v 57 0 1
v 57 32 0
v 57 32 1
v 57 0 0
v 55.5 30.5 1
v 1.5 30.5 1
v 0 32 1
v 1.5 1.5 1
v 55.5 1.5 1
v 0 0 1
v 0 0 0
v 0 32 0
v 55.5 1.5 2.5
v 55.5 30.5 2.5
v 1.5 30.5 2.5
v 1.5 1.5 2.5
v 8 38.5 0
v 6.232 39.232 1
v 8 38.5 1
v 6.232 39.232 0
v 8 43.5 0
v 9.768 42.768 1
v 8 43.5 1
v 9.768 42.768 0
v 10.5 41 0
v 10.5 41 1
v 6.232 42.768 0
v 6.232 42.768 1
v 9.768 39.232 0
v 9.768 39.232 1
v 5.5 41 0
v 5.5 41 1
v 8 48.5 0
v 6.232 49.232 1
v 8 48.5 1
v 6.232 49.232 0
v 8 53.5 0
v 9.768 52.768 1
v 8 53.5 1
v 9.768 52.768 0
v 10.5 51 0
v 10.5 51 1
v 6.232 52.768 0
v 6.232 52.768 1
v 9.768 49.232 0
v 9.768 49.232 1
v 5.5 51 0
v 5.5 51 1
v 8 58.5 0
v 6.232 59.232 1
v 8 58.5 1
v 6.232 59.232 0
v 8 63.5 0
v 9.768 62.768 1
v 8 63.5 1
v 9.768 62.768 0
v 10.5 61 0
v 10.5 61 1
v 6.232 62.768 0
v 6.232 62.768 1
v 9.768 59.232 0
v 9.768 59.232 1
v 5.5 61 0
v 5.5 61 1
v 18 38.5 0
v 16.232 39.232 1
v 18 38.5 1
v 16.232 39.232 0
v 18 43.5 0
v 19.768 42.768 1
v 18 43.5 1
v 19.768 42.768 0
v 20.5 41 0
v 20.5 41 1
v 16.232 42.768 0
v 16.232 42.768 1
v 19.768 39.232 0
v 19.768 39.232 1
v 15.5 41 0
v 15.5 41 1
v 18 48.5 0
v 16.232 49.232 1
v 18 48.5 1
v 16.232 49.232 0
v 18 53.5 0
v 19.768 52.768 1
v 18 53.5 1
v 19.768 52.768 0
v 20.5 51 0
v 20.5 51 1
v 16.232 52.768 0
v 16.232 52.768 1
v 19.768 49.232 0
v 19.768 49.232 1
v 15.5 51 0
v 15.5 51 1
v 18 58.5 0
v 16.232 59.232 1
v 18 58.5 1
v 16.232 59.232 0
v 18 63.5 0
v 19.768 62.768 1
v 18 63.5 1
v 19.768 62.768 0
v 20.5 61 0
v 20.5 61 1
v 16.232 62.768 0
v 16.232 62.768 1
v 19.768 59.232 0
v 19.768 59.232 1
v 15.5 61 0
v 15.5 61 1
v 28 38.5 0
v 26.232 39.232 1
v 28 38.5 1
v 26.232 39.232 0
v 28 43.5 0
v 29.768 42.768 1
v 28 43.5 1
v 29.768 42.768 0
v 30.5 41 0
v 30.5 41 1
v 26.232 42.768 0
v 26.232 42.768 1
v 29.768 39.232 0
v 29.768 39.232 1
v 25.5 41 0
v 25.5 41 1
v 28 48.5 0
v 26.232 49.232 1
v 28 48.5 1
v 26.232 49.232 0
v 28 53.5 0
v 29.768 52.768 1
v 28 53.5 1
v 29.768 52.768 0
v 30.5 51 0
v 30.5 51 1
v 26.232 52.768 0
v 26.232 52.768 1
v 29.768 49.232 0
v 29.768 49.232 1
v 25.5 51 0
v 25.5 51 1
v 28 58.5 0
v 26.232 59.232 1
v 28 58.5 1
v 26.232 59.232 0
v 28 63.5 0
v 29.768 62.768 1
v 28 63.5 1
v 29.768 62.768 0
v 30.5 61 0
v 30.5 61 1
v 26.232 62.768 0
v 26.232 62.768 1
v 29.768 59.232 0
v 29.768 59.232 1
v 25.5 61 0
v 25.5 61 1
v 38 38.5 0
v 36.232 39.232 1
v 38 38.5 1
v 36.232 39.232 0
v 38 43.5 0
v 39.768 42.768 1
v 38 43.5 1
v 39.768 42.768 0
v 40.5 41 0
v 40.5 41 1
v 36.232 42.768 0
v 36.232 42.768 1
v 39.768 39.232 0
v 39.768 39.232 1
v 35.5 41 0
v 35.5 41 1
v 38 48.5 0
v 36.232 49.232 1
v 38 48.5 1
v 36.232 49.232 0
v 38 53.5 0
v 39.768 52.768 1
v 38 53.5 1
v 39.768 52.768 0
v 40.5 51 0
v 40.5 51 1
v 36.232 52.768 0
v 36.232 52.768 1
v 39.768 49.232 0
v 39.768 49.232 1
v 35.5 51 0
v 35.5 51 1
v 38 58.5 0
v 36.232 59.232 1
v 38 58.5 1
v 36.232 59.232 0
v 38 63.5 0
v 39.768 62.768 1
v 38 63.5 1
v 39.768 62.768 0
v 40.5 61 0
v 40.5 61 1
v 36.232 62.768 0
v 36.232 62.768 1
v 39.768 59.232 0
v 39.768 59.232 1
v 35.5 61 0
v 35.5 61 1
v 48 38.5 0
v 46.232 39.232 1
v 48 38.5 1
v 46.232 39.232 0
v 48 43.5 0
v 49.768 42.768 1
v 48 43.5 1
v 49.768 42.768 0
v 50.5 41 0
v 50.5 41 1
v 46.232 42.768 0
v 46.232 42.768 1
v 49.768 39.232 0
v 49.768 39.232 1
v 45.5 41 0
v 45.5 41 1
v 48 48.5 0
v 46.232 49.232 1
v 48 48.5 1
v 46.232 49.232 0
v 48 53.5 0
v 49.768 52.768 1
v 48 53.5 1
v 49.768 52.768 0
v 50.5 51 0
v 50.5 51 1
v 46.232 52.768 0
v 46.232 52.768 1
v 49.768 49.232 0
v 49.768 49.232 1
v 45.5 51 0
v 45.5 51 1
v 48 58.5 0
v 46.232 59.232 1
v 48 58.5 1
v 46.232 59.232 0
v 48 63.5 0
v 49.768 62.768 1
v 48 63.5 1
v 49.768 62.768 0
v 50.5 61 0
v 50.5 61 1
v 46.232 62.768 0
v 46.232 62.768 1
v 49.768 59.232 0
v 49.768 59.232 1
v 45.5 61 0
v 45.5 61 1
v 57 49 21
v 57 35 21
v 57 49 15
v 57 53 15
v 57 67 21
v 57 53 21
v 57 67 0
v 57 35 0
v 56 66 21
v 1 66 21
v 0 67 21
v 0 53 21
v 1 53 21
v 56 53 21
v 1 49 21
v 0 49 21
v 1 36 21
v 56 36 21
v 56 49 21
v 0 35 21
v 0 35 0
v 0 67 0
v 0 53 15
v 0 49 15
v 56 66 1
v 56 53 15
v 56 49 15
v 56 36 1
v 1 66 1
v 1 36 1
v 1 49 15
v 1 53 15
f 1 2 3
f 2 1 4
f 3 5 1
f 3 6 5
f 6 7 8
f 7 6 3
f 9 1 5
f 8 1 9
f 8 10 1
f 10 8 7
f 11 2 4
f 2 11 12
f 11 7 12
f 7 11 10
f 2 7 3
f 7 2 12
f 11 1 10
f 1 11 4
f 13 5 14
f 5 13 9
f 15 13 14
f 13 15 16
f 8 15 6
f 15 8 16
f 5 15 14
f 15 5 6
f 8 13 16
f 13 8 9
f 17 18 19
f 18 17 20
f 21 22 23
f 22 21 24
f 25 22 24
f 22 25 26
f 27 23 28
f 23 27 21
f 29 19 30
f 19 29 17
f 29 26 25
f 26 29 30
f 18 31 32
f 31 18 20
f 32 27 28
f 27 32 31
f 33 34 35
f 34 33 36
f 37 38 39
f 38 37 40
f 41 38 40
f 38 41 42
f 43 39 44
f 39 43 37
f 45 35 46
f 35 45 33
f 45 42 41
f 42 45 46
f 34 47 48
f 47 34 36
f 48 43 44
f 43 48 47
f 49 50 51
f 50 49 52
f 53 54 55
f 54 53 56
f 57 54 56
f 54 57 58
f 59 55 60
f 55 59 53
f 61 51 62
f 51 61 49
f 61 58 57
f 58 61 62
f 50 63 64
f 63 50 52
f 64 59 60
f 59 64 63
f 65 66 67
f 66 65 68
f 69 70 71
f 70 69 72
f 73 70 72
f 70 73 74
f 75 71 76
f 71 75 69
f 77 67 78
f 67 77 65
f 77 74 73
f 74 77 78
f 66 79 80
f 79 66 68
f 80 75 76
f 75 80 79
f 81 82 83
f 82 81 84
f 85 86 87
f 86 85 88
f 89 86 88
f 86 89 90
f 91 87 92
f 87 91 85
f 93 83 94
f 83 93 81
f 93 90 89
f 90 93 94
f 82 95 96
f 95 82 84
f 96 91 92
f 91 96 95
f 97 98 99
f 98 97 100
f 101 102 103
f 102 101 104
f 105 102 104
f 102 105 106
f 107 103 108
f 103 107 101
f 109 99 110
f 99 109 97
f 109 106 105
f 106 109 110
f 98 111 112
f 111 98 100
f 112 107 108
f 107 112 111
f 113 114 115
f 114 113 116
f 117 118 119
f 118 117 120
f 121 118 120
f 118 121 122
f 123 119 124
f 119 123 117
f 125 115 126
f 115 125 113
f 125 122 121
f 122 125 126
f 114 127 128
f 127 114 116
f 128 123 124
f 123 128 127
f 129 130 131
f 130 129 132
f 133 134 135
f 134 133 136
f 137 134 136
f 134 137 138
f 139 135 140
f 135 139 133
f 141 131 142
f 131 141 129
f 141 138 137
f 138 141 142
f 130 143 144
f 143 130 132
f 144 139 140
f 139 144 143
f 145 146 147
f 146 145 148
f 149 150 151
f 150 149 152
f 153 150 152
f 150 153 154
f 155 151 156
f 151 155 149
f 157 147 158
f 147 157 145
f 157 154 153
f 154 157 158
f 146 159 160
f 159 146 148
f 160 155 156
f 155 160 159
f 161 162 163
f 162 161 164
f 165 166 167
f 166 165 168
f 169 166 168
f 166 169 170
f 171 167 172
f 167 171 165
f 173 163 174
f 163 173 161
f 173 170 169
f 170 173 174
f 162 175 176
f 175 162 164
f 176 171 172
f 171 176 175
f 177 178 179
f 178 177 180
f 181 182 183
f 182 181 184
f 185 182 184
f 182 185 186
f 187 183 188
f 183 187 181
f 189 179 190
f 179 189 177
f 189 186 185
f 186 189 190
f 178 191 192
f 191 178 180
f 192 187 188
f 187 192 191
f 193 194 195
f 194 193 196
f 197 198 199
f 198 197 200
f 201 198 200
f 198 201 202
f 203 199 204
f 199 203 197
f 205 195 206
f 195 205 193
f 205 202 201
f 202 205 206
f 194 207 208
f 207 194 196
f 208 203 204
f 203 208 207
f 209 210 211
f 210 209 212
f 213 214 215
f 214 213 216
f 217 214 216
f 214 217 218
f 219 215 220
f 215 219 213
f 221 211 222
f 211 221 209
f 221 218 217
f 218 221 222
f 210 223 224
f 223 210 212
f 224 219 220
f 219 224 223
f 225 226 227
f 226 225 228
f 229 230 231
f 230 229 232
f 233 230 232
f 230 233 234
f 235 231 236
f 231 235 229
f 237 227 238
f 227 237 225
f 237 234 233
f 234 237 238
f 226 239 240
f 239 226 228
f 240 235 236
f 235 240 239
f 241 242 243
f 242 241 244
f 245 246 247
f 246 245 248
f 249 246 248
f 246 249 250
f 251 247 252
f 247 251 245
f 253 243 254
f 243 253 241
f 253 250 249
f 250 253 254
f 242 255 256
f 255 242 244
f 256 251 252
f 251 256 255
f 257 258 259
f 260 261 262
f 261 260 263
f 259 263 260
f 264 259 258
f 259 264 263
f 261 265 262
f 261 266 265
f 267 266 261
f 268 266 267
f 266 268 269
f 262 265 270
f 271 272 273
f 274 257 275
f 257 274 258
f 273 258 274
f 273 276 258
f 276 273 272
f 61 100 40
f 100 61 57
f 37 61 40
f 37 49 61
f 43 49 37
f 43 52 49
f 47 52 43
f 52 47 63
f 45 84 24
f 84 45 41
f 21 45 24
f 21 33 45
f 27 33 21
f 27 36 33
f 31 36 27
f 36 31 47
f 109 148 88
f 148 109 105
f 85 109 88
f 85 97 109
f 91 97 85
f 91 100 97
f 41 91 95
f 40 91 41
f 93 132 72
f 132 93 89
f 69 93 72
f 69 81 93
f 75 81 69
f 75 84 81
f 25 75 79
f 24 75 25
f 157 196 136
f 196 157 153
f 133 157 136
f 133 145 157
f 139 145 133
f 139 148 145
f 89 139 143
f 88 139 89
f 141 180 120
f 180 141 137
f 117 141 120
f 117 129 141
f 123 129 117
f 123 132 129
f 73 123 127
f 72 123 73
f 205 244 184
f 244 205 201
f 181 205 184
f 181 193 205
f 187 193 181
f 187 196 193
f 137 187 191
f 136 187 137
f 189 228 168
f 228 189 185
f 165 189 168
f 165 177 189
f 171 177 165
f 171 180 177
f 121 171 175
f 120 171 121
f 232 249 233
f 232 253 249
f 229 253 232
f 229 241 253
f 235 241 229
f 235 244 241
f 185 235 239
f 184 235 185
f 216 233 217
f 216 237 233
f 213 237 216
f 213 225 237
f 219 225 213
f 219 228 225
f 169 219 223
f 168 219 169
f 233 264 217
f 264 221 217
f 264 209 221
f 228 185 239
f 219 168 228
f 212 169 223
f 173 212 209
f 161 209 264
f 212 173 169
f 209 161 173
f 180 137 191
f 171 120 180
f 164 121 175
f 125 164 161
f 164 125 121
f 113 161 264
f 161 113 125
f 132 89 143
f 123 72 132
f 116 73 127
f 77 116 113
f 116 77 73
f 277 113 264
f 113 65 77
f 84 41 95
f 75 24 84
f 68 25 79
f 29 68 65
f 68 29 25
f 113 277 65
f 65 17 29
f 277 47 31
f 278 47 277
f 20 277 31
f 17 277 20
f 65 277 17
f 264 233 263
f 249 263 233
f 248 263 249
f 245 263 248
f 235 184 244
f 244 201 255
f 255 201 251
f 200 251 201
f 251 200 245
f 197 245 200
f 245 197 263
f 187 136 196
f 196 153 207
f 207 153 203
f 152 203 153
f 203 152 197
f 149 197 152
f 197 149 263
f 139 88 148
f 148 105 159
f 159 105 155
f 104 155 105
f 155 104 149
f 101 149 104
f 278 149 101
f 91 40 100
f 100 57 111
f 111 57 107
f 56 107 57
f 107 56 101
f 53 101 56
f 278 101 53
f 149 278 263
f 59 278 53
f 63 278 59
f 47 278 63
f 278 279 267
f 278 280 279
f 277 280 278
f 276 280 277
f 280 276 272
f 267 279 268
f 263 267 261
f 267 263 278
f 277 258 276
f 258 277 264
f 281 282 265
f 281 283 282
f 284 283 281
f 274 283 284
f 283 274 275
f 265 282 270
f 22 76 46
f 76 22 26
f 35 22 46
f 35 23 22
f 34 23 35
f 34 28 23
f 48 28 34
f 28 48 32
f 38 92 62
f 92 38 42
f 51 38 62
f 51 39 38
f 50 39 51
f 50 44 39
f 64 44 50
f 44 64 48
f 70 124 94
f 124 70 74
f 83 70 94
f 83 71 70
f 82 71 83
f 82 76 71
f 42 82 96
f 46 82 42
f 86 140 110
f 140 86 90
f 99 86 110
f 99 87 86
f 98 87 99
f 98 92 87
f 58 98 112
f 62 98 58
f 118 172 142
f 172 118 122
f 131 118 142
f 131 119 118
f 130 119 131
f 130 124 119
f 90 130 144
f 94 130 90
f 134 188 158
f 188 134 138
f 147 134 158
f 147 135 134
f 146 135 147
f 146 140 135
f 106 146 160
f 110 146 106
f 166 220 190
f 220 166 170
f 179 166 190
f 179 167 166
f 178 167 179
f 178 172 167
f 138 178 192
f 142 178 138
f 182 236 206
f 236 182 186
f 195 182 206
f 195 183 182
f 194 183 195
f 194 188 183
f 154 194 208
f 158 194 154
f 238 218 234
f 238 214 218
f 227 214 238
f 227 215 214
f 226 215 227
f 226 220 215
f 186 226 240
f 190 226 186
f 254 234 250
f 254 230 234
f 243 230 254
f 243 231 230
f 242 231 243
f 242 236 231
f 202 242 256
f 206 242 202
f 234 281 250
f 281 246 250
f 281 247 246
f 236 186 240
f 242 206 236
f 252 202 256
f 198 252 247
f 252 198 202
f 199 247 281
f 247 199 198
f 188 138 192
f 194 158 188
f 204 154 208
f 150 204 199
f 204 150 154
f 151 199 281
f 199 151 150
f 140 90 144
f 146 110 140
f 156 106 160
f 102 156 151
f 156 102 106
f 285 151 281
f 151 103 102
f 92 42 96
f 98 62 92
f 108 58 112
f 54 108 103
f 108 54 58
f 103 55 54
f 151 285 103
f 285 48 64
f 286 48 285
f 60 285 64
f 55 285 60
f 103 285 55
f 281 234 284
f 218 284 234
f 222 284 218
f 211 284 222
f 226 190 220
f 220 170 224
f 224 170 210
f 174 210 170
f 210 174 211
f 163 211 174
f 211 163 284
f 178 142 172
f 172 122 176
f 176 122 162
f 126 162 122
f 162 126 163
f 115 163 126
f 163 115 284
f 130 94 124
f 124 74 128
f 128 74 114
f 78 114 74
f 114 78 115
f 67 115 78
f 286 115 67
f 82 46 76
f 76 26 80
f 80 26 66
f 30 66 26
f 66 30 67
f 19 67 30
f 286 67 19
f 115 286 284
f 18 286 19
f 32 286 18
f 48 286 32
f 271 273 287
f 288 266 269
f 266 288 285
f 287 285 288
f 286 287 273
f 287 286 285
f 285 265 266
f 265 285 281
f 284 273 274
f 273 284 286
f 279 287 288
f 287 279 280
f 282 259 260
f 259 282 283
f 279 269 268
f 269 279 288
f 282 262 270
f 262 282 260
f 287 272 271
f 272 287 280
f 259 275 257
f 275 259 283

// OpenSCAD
// file: detail/config.scad
eps = 0.01;
int_size = [55, 30, 20];
wall = 1;
ext_size = int_size + wall * [2,2,2];
// file: box_bottom.scad
include <detail/config.scad>

module bottom()
{
  difference()
  {
    cube(ext_size - [0,0,wall]);
    // inner cut
    translate(wall*[1,1,1])
      cube(int_size + [0,0,eps]);
    // ventilation holes
    {
      d = 5;
      for(ix=[0:2*d:int_size[0]-2*d])
        for(iy=[0:2*d:int_size[1]-d])
          translate((wall+d)*[1,1,0] + [2,0,0] + [ix, iy, -eps])
            cylinder(d=d, h=3*wall);
    }
    // cable holes
    {
      h = wall*2+5;
      translate([-eps, ext_size[1]/2-4/2, ext_size[2]-h])
        cube([ext_size[0]+2*eps, 4, h]);
    }
  }
}

bottom();
// file: box_top.scad
include <detail/config.scad>


module top()
{
  w = wall + 0.5;
  cube([ext_size[0], ext_size[1], wall]);
  translate(w*[1,1,0])
    cube([ext_size[0]-2*w, ext_size[1]-2*w, wall+w]);
}

top();
// main file
use <box_top.scad>
use <box_bottom.scad>


top();
translate([0, 35, 0])
  bottom();
